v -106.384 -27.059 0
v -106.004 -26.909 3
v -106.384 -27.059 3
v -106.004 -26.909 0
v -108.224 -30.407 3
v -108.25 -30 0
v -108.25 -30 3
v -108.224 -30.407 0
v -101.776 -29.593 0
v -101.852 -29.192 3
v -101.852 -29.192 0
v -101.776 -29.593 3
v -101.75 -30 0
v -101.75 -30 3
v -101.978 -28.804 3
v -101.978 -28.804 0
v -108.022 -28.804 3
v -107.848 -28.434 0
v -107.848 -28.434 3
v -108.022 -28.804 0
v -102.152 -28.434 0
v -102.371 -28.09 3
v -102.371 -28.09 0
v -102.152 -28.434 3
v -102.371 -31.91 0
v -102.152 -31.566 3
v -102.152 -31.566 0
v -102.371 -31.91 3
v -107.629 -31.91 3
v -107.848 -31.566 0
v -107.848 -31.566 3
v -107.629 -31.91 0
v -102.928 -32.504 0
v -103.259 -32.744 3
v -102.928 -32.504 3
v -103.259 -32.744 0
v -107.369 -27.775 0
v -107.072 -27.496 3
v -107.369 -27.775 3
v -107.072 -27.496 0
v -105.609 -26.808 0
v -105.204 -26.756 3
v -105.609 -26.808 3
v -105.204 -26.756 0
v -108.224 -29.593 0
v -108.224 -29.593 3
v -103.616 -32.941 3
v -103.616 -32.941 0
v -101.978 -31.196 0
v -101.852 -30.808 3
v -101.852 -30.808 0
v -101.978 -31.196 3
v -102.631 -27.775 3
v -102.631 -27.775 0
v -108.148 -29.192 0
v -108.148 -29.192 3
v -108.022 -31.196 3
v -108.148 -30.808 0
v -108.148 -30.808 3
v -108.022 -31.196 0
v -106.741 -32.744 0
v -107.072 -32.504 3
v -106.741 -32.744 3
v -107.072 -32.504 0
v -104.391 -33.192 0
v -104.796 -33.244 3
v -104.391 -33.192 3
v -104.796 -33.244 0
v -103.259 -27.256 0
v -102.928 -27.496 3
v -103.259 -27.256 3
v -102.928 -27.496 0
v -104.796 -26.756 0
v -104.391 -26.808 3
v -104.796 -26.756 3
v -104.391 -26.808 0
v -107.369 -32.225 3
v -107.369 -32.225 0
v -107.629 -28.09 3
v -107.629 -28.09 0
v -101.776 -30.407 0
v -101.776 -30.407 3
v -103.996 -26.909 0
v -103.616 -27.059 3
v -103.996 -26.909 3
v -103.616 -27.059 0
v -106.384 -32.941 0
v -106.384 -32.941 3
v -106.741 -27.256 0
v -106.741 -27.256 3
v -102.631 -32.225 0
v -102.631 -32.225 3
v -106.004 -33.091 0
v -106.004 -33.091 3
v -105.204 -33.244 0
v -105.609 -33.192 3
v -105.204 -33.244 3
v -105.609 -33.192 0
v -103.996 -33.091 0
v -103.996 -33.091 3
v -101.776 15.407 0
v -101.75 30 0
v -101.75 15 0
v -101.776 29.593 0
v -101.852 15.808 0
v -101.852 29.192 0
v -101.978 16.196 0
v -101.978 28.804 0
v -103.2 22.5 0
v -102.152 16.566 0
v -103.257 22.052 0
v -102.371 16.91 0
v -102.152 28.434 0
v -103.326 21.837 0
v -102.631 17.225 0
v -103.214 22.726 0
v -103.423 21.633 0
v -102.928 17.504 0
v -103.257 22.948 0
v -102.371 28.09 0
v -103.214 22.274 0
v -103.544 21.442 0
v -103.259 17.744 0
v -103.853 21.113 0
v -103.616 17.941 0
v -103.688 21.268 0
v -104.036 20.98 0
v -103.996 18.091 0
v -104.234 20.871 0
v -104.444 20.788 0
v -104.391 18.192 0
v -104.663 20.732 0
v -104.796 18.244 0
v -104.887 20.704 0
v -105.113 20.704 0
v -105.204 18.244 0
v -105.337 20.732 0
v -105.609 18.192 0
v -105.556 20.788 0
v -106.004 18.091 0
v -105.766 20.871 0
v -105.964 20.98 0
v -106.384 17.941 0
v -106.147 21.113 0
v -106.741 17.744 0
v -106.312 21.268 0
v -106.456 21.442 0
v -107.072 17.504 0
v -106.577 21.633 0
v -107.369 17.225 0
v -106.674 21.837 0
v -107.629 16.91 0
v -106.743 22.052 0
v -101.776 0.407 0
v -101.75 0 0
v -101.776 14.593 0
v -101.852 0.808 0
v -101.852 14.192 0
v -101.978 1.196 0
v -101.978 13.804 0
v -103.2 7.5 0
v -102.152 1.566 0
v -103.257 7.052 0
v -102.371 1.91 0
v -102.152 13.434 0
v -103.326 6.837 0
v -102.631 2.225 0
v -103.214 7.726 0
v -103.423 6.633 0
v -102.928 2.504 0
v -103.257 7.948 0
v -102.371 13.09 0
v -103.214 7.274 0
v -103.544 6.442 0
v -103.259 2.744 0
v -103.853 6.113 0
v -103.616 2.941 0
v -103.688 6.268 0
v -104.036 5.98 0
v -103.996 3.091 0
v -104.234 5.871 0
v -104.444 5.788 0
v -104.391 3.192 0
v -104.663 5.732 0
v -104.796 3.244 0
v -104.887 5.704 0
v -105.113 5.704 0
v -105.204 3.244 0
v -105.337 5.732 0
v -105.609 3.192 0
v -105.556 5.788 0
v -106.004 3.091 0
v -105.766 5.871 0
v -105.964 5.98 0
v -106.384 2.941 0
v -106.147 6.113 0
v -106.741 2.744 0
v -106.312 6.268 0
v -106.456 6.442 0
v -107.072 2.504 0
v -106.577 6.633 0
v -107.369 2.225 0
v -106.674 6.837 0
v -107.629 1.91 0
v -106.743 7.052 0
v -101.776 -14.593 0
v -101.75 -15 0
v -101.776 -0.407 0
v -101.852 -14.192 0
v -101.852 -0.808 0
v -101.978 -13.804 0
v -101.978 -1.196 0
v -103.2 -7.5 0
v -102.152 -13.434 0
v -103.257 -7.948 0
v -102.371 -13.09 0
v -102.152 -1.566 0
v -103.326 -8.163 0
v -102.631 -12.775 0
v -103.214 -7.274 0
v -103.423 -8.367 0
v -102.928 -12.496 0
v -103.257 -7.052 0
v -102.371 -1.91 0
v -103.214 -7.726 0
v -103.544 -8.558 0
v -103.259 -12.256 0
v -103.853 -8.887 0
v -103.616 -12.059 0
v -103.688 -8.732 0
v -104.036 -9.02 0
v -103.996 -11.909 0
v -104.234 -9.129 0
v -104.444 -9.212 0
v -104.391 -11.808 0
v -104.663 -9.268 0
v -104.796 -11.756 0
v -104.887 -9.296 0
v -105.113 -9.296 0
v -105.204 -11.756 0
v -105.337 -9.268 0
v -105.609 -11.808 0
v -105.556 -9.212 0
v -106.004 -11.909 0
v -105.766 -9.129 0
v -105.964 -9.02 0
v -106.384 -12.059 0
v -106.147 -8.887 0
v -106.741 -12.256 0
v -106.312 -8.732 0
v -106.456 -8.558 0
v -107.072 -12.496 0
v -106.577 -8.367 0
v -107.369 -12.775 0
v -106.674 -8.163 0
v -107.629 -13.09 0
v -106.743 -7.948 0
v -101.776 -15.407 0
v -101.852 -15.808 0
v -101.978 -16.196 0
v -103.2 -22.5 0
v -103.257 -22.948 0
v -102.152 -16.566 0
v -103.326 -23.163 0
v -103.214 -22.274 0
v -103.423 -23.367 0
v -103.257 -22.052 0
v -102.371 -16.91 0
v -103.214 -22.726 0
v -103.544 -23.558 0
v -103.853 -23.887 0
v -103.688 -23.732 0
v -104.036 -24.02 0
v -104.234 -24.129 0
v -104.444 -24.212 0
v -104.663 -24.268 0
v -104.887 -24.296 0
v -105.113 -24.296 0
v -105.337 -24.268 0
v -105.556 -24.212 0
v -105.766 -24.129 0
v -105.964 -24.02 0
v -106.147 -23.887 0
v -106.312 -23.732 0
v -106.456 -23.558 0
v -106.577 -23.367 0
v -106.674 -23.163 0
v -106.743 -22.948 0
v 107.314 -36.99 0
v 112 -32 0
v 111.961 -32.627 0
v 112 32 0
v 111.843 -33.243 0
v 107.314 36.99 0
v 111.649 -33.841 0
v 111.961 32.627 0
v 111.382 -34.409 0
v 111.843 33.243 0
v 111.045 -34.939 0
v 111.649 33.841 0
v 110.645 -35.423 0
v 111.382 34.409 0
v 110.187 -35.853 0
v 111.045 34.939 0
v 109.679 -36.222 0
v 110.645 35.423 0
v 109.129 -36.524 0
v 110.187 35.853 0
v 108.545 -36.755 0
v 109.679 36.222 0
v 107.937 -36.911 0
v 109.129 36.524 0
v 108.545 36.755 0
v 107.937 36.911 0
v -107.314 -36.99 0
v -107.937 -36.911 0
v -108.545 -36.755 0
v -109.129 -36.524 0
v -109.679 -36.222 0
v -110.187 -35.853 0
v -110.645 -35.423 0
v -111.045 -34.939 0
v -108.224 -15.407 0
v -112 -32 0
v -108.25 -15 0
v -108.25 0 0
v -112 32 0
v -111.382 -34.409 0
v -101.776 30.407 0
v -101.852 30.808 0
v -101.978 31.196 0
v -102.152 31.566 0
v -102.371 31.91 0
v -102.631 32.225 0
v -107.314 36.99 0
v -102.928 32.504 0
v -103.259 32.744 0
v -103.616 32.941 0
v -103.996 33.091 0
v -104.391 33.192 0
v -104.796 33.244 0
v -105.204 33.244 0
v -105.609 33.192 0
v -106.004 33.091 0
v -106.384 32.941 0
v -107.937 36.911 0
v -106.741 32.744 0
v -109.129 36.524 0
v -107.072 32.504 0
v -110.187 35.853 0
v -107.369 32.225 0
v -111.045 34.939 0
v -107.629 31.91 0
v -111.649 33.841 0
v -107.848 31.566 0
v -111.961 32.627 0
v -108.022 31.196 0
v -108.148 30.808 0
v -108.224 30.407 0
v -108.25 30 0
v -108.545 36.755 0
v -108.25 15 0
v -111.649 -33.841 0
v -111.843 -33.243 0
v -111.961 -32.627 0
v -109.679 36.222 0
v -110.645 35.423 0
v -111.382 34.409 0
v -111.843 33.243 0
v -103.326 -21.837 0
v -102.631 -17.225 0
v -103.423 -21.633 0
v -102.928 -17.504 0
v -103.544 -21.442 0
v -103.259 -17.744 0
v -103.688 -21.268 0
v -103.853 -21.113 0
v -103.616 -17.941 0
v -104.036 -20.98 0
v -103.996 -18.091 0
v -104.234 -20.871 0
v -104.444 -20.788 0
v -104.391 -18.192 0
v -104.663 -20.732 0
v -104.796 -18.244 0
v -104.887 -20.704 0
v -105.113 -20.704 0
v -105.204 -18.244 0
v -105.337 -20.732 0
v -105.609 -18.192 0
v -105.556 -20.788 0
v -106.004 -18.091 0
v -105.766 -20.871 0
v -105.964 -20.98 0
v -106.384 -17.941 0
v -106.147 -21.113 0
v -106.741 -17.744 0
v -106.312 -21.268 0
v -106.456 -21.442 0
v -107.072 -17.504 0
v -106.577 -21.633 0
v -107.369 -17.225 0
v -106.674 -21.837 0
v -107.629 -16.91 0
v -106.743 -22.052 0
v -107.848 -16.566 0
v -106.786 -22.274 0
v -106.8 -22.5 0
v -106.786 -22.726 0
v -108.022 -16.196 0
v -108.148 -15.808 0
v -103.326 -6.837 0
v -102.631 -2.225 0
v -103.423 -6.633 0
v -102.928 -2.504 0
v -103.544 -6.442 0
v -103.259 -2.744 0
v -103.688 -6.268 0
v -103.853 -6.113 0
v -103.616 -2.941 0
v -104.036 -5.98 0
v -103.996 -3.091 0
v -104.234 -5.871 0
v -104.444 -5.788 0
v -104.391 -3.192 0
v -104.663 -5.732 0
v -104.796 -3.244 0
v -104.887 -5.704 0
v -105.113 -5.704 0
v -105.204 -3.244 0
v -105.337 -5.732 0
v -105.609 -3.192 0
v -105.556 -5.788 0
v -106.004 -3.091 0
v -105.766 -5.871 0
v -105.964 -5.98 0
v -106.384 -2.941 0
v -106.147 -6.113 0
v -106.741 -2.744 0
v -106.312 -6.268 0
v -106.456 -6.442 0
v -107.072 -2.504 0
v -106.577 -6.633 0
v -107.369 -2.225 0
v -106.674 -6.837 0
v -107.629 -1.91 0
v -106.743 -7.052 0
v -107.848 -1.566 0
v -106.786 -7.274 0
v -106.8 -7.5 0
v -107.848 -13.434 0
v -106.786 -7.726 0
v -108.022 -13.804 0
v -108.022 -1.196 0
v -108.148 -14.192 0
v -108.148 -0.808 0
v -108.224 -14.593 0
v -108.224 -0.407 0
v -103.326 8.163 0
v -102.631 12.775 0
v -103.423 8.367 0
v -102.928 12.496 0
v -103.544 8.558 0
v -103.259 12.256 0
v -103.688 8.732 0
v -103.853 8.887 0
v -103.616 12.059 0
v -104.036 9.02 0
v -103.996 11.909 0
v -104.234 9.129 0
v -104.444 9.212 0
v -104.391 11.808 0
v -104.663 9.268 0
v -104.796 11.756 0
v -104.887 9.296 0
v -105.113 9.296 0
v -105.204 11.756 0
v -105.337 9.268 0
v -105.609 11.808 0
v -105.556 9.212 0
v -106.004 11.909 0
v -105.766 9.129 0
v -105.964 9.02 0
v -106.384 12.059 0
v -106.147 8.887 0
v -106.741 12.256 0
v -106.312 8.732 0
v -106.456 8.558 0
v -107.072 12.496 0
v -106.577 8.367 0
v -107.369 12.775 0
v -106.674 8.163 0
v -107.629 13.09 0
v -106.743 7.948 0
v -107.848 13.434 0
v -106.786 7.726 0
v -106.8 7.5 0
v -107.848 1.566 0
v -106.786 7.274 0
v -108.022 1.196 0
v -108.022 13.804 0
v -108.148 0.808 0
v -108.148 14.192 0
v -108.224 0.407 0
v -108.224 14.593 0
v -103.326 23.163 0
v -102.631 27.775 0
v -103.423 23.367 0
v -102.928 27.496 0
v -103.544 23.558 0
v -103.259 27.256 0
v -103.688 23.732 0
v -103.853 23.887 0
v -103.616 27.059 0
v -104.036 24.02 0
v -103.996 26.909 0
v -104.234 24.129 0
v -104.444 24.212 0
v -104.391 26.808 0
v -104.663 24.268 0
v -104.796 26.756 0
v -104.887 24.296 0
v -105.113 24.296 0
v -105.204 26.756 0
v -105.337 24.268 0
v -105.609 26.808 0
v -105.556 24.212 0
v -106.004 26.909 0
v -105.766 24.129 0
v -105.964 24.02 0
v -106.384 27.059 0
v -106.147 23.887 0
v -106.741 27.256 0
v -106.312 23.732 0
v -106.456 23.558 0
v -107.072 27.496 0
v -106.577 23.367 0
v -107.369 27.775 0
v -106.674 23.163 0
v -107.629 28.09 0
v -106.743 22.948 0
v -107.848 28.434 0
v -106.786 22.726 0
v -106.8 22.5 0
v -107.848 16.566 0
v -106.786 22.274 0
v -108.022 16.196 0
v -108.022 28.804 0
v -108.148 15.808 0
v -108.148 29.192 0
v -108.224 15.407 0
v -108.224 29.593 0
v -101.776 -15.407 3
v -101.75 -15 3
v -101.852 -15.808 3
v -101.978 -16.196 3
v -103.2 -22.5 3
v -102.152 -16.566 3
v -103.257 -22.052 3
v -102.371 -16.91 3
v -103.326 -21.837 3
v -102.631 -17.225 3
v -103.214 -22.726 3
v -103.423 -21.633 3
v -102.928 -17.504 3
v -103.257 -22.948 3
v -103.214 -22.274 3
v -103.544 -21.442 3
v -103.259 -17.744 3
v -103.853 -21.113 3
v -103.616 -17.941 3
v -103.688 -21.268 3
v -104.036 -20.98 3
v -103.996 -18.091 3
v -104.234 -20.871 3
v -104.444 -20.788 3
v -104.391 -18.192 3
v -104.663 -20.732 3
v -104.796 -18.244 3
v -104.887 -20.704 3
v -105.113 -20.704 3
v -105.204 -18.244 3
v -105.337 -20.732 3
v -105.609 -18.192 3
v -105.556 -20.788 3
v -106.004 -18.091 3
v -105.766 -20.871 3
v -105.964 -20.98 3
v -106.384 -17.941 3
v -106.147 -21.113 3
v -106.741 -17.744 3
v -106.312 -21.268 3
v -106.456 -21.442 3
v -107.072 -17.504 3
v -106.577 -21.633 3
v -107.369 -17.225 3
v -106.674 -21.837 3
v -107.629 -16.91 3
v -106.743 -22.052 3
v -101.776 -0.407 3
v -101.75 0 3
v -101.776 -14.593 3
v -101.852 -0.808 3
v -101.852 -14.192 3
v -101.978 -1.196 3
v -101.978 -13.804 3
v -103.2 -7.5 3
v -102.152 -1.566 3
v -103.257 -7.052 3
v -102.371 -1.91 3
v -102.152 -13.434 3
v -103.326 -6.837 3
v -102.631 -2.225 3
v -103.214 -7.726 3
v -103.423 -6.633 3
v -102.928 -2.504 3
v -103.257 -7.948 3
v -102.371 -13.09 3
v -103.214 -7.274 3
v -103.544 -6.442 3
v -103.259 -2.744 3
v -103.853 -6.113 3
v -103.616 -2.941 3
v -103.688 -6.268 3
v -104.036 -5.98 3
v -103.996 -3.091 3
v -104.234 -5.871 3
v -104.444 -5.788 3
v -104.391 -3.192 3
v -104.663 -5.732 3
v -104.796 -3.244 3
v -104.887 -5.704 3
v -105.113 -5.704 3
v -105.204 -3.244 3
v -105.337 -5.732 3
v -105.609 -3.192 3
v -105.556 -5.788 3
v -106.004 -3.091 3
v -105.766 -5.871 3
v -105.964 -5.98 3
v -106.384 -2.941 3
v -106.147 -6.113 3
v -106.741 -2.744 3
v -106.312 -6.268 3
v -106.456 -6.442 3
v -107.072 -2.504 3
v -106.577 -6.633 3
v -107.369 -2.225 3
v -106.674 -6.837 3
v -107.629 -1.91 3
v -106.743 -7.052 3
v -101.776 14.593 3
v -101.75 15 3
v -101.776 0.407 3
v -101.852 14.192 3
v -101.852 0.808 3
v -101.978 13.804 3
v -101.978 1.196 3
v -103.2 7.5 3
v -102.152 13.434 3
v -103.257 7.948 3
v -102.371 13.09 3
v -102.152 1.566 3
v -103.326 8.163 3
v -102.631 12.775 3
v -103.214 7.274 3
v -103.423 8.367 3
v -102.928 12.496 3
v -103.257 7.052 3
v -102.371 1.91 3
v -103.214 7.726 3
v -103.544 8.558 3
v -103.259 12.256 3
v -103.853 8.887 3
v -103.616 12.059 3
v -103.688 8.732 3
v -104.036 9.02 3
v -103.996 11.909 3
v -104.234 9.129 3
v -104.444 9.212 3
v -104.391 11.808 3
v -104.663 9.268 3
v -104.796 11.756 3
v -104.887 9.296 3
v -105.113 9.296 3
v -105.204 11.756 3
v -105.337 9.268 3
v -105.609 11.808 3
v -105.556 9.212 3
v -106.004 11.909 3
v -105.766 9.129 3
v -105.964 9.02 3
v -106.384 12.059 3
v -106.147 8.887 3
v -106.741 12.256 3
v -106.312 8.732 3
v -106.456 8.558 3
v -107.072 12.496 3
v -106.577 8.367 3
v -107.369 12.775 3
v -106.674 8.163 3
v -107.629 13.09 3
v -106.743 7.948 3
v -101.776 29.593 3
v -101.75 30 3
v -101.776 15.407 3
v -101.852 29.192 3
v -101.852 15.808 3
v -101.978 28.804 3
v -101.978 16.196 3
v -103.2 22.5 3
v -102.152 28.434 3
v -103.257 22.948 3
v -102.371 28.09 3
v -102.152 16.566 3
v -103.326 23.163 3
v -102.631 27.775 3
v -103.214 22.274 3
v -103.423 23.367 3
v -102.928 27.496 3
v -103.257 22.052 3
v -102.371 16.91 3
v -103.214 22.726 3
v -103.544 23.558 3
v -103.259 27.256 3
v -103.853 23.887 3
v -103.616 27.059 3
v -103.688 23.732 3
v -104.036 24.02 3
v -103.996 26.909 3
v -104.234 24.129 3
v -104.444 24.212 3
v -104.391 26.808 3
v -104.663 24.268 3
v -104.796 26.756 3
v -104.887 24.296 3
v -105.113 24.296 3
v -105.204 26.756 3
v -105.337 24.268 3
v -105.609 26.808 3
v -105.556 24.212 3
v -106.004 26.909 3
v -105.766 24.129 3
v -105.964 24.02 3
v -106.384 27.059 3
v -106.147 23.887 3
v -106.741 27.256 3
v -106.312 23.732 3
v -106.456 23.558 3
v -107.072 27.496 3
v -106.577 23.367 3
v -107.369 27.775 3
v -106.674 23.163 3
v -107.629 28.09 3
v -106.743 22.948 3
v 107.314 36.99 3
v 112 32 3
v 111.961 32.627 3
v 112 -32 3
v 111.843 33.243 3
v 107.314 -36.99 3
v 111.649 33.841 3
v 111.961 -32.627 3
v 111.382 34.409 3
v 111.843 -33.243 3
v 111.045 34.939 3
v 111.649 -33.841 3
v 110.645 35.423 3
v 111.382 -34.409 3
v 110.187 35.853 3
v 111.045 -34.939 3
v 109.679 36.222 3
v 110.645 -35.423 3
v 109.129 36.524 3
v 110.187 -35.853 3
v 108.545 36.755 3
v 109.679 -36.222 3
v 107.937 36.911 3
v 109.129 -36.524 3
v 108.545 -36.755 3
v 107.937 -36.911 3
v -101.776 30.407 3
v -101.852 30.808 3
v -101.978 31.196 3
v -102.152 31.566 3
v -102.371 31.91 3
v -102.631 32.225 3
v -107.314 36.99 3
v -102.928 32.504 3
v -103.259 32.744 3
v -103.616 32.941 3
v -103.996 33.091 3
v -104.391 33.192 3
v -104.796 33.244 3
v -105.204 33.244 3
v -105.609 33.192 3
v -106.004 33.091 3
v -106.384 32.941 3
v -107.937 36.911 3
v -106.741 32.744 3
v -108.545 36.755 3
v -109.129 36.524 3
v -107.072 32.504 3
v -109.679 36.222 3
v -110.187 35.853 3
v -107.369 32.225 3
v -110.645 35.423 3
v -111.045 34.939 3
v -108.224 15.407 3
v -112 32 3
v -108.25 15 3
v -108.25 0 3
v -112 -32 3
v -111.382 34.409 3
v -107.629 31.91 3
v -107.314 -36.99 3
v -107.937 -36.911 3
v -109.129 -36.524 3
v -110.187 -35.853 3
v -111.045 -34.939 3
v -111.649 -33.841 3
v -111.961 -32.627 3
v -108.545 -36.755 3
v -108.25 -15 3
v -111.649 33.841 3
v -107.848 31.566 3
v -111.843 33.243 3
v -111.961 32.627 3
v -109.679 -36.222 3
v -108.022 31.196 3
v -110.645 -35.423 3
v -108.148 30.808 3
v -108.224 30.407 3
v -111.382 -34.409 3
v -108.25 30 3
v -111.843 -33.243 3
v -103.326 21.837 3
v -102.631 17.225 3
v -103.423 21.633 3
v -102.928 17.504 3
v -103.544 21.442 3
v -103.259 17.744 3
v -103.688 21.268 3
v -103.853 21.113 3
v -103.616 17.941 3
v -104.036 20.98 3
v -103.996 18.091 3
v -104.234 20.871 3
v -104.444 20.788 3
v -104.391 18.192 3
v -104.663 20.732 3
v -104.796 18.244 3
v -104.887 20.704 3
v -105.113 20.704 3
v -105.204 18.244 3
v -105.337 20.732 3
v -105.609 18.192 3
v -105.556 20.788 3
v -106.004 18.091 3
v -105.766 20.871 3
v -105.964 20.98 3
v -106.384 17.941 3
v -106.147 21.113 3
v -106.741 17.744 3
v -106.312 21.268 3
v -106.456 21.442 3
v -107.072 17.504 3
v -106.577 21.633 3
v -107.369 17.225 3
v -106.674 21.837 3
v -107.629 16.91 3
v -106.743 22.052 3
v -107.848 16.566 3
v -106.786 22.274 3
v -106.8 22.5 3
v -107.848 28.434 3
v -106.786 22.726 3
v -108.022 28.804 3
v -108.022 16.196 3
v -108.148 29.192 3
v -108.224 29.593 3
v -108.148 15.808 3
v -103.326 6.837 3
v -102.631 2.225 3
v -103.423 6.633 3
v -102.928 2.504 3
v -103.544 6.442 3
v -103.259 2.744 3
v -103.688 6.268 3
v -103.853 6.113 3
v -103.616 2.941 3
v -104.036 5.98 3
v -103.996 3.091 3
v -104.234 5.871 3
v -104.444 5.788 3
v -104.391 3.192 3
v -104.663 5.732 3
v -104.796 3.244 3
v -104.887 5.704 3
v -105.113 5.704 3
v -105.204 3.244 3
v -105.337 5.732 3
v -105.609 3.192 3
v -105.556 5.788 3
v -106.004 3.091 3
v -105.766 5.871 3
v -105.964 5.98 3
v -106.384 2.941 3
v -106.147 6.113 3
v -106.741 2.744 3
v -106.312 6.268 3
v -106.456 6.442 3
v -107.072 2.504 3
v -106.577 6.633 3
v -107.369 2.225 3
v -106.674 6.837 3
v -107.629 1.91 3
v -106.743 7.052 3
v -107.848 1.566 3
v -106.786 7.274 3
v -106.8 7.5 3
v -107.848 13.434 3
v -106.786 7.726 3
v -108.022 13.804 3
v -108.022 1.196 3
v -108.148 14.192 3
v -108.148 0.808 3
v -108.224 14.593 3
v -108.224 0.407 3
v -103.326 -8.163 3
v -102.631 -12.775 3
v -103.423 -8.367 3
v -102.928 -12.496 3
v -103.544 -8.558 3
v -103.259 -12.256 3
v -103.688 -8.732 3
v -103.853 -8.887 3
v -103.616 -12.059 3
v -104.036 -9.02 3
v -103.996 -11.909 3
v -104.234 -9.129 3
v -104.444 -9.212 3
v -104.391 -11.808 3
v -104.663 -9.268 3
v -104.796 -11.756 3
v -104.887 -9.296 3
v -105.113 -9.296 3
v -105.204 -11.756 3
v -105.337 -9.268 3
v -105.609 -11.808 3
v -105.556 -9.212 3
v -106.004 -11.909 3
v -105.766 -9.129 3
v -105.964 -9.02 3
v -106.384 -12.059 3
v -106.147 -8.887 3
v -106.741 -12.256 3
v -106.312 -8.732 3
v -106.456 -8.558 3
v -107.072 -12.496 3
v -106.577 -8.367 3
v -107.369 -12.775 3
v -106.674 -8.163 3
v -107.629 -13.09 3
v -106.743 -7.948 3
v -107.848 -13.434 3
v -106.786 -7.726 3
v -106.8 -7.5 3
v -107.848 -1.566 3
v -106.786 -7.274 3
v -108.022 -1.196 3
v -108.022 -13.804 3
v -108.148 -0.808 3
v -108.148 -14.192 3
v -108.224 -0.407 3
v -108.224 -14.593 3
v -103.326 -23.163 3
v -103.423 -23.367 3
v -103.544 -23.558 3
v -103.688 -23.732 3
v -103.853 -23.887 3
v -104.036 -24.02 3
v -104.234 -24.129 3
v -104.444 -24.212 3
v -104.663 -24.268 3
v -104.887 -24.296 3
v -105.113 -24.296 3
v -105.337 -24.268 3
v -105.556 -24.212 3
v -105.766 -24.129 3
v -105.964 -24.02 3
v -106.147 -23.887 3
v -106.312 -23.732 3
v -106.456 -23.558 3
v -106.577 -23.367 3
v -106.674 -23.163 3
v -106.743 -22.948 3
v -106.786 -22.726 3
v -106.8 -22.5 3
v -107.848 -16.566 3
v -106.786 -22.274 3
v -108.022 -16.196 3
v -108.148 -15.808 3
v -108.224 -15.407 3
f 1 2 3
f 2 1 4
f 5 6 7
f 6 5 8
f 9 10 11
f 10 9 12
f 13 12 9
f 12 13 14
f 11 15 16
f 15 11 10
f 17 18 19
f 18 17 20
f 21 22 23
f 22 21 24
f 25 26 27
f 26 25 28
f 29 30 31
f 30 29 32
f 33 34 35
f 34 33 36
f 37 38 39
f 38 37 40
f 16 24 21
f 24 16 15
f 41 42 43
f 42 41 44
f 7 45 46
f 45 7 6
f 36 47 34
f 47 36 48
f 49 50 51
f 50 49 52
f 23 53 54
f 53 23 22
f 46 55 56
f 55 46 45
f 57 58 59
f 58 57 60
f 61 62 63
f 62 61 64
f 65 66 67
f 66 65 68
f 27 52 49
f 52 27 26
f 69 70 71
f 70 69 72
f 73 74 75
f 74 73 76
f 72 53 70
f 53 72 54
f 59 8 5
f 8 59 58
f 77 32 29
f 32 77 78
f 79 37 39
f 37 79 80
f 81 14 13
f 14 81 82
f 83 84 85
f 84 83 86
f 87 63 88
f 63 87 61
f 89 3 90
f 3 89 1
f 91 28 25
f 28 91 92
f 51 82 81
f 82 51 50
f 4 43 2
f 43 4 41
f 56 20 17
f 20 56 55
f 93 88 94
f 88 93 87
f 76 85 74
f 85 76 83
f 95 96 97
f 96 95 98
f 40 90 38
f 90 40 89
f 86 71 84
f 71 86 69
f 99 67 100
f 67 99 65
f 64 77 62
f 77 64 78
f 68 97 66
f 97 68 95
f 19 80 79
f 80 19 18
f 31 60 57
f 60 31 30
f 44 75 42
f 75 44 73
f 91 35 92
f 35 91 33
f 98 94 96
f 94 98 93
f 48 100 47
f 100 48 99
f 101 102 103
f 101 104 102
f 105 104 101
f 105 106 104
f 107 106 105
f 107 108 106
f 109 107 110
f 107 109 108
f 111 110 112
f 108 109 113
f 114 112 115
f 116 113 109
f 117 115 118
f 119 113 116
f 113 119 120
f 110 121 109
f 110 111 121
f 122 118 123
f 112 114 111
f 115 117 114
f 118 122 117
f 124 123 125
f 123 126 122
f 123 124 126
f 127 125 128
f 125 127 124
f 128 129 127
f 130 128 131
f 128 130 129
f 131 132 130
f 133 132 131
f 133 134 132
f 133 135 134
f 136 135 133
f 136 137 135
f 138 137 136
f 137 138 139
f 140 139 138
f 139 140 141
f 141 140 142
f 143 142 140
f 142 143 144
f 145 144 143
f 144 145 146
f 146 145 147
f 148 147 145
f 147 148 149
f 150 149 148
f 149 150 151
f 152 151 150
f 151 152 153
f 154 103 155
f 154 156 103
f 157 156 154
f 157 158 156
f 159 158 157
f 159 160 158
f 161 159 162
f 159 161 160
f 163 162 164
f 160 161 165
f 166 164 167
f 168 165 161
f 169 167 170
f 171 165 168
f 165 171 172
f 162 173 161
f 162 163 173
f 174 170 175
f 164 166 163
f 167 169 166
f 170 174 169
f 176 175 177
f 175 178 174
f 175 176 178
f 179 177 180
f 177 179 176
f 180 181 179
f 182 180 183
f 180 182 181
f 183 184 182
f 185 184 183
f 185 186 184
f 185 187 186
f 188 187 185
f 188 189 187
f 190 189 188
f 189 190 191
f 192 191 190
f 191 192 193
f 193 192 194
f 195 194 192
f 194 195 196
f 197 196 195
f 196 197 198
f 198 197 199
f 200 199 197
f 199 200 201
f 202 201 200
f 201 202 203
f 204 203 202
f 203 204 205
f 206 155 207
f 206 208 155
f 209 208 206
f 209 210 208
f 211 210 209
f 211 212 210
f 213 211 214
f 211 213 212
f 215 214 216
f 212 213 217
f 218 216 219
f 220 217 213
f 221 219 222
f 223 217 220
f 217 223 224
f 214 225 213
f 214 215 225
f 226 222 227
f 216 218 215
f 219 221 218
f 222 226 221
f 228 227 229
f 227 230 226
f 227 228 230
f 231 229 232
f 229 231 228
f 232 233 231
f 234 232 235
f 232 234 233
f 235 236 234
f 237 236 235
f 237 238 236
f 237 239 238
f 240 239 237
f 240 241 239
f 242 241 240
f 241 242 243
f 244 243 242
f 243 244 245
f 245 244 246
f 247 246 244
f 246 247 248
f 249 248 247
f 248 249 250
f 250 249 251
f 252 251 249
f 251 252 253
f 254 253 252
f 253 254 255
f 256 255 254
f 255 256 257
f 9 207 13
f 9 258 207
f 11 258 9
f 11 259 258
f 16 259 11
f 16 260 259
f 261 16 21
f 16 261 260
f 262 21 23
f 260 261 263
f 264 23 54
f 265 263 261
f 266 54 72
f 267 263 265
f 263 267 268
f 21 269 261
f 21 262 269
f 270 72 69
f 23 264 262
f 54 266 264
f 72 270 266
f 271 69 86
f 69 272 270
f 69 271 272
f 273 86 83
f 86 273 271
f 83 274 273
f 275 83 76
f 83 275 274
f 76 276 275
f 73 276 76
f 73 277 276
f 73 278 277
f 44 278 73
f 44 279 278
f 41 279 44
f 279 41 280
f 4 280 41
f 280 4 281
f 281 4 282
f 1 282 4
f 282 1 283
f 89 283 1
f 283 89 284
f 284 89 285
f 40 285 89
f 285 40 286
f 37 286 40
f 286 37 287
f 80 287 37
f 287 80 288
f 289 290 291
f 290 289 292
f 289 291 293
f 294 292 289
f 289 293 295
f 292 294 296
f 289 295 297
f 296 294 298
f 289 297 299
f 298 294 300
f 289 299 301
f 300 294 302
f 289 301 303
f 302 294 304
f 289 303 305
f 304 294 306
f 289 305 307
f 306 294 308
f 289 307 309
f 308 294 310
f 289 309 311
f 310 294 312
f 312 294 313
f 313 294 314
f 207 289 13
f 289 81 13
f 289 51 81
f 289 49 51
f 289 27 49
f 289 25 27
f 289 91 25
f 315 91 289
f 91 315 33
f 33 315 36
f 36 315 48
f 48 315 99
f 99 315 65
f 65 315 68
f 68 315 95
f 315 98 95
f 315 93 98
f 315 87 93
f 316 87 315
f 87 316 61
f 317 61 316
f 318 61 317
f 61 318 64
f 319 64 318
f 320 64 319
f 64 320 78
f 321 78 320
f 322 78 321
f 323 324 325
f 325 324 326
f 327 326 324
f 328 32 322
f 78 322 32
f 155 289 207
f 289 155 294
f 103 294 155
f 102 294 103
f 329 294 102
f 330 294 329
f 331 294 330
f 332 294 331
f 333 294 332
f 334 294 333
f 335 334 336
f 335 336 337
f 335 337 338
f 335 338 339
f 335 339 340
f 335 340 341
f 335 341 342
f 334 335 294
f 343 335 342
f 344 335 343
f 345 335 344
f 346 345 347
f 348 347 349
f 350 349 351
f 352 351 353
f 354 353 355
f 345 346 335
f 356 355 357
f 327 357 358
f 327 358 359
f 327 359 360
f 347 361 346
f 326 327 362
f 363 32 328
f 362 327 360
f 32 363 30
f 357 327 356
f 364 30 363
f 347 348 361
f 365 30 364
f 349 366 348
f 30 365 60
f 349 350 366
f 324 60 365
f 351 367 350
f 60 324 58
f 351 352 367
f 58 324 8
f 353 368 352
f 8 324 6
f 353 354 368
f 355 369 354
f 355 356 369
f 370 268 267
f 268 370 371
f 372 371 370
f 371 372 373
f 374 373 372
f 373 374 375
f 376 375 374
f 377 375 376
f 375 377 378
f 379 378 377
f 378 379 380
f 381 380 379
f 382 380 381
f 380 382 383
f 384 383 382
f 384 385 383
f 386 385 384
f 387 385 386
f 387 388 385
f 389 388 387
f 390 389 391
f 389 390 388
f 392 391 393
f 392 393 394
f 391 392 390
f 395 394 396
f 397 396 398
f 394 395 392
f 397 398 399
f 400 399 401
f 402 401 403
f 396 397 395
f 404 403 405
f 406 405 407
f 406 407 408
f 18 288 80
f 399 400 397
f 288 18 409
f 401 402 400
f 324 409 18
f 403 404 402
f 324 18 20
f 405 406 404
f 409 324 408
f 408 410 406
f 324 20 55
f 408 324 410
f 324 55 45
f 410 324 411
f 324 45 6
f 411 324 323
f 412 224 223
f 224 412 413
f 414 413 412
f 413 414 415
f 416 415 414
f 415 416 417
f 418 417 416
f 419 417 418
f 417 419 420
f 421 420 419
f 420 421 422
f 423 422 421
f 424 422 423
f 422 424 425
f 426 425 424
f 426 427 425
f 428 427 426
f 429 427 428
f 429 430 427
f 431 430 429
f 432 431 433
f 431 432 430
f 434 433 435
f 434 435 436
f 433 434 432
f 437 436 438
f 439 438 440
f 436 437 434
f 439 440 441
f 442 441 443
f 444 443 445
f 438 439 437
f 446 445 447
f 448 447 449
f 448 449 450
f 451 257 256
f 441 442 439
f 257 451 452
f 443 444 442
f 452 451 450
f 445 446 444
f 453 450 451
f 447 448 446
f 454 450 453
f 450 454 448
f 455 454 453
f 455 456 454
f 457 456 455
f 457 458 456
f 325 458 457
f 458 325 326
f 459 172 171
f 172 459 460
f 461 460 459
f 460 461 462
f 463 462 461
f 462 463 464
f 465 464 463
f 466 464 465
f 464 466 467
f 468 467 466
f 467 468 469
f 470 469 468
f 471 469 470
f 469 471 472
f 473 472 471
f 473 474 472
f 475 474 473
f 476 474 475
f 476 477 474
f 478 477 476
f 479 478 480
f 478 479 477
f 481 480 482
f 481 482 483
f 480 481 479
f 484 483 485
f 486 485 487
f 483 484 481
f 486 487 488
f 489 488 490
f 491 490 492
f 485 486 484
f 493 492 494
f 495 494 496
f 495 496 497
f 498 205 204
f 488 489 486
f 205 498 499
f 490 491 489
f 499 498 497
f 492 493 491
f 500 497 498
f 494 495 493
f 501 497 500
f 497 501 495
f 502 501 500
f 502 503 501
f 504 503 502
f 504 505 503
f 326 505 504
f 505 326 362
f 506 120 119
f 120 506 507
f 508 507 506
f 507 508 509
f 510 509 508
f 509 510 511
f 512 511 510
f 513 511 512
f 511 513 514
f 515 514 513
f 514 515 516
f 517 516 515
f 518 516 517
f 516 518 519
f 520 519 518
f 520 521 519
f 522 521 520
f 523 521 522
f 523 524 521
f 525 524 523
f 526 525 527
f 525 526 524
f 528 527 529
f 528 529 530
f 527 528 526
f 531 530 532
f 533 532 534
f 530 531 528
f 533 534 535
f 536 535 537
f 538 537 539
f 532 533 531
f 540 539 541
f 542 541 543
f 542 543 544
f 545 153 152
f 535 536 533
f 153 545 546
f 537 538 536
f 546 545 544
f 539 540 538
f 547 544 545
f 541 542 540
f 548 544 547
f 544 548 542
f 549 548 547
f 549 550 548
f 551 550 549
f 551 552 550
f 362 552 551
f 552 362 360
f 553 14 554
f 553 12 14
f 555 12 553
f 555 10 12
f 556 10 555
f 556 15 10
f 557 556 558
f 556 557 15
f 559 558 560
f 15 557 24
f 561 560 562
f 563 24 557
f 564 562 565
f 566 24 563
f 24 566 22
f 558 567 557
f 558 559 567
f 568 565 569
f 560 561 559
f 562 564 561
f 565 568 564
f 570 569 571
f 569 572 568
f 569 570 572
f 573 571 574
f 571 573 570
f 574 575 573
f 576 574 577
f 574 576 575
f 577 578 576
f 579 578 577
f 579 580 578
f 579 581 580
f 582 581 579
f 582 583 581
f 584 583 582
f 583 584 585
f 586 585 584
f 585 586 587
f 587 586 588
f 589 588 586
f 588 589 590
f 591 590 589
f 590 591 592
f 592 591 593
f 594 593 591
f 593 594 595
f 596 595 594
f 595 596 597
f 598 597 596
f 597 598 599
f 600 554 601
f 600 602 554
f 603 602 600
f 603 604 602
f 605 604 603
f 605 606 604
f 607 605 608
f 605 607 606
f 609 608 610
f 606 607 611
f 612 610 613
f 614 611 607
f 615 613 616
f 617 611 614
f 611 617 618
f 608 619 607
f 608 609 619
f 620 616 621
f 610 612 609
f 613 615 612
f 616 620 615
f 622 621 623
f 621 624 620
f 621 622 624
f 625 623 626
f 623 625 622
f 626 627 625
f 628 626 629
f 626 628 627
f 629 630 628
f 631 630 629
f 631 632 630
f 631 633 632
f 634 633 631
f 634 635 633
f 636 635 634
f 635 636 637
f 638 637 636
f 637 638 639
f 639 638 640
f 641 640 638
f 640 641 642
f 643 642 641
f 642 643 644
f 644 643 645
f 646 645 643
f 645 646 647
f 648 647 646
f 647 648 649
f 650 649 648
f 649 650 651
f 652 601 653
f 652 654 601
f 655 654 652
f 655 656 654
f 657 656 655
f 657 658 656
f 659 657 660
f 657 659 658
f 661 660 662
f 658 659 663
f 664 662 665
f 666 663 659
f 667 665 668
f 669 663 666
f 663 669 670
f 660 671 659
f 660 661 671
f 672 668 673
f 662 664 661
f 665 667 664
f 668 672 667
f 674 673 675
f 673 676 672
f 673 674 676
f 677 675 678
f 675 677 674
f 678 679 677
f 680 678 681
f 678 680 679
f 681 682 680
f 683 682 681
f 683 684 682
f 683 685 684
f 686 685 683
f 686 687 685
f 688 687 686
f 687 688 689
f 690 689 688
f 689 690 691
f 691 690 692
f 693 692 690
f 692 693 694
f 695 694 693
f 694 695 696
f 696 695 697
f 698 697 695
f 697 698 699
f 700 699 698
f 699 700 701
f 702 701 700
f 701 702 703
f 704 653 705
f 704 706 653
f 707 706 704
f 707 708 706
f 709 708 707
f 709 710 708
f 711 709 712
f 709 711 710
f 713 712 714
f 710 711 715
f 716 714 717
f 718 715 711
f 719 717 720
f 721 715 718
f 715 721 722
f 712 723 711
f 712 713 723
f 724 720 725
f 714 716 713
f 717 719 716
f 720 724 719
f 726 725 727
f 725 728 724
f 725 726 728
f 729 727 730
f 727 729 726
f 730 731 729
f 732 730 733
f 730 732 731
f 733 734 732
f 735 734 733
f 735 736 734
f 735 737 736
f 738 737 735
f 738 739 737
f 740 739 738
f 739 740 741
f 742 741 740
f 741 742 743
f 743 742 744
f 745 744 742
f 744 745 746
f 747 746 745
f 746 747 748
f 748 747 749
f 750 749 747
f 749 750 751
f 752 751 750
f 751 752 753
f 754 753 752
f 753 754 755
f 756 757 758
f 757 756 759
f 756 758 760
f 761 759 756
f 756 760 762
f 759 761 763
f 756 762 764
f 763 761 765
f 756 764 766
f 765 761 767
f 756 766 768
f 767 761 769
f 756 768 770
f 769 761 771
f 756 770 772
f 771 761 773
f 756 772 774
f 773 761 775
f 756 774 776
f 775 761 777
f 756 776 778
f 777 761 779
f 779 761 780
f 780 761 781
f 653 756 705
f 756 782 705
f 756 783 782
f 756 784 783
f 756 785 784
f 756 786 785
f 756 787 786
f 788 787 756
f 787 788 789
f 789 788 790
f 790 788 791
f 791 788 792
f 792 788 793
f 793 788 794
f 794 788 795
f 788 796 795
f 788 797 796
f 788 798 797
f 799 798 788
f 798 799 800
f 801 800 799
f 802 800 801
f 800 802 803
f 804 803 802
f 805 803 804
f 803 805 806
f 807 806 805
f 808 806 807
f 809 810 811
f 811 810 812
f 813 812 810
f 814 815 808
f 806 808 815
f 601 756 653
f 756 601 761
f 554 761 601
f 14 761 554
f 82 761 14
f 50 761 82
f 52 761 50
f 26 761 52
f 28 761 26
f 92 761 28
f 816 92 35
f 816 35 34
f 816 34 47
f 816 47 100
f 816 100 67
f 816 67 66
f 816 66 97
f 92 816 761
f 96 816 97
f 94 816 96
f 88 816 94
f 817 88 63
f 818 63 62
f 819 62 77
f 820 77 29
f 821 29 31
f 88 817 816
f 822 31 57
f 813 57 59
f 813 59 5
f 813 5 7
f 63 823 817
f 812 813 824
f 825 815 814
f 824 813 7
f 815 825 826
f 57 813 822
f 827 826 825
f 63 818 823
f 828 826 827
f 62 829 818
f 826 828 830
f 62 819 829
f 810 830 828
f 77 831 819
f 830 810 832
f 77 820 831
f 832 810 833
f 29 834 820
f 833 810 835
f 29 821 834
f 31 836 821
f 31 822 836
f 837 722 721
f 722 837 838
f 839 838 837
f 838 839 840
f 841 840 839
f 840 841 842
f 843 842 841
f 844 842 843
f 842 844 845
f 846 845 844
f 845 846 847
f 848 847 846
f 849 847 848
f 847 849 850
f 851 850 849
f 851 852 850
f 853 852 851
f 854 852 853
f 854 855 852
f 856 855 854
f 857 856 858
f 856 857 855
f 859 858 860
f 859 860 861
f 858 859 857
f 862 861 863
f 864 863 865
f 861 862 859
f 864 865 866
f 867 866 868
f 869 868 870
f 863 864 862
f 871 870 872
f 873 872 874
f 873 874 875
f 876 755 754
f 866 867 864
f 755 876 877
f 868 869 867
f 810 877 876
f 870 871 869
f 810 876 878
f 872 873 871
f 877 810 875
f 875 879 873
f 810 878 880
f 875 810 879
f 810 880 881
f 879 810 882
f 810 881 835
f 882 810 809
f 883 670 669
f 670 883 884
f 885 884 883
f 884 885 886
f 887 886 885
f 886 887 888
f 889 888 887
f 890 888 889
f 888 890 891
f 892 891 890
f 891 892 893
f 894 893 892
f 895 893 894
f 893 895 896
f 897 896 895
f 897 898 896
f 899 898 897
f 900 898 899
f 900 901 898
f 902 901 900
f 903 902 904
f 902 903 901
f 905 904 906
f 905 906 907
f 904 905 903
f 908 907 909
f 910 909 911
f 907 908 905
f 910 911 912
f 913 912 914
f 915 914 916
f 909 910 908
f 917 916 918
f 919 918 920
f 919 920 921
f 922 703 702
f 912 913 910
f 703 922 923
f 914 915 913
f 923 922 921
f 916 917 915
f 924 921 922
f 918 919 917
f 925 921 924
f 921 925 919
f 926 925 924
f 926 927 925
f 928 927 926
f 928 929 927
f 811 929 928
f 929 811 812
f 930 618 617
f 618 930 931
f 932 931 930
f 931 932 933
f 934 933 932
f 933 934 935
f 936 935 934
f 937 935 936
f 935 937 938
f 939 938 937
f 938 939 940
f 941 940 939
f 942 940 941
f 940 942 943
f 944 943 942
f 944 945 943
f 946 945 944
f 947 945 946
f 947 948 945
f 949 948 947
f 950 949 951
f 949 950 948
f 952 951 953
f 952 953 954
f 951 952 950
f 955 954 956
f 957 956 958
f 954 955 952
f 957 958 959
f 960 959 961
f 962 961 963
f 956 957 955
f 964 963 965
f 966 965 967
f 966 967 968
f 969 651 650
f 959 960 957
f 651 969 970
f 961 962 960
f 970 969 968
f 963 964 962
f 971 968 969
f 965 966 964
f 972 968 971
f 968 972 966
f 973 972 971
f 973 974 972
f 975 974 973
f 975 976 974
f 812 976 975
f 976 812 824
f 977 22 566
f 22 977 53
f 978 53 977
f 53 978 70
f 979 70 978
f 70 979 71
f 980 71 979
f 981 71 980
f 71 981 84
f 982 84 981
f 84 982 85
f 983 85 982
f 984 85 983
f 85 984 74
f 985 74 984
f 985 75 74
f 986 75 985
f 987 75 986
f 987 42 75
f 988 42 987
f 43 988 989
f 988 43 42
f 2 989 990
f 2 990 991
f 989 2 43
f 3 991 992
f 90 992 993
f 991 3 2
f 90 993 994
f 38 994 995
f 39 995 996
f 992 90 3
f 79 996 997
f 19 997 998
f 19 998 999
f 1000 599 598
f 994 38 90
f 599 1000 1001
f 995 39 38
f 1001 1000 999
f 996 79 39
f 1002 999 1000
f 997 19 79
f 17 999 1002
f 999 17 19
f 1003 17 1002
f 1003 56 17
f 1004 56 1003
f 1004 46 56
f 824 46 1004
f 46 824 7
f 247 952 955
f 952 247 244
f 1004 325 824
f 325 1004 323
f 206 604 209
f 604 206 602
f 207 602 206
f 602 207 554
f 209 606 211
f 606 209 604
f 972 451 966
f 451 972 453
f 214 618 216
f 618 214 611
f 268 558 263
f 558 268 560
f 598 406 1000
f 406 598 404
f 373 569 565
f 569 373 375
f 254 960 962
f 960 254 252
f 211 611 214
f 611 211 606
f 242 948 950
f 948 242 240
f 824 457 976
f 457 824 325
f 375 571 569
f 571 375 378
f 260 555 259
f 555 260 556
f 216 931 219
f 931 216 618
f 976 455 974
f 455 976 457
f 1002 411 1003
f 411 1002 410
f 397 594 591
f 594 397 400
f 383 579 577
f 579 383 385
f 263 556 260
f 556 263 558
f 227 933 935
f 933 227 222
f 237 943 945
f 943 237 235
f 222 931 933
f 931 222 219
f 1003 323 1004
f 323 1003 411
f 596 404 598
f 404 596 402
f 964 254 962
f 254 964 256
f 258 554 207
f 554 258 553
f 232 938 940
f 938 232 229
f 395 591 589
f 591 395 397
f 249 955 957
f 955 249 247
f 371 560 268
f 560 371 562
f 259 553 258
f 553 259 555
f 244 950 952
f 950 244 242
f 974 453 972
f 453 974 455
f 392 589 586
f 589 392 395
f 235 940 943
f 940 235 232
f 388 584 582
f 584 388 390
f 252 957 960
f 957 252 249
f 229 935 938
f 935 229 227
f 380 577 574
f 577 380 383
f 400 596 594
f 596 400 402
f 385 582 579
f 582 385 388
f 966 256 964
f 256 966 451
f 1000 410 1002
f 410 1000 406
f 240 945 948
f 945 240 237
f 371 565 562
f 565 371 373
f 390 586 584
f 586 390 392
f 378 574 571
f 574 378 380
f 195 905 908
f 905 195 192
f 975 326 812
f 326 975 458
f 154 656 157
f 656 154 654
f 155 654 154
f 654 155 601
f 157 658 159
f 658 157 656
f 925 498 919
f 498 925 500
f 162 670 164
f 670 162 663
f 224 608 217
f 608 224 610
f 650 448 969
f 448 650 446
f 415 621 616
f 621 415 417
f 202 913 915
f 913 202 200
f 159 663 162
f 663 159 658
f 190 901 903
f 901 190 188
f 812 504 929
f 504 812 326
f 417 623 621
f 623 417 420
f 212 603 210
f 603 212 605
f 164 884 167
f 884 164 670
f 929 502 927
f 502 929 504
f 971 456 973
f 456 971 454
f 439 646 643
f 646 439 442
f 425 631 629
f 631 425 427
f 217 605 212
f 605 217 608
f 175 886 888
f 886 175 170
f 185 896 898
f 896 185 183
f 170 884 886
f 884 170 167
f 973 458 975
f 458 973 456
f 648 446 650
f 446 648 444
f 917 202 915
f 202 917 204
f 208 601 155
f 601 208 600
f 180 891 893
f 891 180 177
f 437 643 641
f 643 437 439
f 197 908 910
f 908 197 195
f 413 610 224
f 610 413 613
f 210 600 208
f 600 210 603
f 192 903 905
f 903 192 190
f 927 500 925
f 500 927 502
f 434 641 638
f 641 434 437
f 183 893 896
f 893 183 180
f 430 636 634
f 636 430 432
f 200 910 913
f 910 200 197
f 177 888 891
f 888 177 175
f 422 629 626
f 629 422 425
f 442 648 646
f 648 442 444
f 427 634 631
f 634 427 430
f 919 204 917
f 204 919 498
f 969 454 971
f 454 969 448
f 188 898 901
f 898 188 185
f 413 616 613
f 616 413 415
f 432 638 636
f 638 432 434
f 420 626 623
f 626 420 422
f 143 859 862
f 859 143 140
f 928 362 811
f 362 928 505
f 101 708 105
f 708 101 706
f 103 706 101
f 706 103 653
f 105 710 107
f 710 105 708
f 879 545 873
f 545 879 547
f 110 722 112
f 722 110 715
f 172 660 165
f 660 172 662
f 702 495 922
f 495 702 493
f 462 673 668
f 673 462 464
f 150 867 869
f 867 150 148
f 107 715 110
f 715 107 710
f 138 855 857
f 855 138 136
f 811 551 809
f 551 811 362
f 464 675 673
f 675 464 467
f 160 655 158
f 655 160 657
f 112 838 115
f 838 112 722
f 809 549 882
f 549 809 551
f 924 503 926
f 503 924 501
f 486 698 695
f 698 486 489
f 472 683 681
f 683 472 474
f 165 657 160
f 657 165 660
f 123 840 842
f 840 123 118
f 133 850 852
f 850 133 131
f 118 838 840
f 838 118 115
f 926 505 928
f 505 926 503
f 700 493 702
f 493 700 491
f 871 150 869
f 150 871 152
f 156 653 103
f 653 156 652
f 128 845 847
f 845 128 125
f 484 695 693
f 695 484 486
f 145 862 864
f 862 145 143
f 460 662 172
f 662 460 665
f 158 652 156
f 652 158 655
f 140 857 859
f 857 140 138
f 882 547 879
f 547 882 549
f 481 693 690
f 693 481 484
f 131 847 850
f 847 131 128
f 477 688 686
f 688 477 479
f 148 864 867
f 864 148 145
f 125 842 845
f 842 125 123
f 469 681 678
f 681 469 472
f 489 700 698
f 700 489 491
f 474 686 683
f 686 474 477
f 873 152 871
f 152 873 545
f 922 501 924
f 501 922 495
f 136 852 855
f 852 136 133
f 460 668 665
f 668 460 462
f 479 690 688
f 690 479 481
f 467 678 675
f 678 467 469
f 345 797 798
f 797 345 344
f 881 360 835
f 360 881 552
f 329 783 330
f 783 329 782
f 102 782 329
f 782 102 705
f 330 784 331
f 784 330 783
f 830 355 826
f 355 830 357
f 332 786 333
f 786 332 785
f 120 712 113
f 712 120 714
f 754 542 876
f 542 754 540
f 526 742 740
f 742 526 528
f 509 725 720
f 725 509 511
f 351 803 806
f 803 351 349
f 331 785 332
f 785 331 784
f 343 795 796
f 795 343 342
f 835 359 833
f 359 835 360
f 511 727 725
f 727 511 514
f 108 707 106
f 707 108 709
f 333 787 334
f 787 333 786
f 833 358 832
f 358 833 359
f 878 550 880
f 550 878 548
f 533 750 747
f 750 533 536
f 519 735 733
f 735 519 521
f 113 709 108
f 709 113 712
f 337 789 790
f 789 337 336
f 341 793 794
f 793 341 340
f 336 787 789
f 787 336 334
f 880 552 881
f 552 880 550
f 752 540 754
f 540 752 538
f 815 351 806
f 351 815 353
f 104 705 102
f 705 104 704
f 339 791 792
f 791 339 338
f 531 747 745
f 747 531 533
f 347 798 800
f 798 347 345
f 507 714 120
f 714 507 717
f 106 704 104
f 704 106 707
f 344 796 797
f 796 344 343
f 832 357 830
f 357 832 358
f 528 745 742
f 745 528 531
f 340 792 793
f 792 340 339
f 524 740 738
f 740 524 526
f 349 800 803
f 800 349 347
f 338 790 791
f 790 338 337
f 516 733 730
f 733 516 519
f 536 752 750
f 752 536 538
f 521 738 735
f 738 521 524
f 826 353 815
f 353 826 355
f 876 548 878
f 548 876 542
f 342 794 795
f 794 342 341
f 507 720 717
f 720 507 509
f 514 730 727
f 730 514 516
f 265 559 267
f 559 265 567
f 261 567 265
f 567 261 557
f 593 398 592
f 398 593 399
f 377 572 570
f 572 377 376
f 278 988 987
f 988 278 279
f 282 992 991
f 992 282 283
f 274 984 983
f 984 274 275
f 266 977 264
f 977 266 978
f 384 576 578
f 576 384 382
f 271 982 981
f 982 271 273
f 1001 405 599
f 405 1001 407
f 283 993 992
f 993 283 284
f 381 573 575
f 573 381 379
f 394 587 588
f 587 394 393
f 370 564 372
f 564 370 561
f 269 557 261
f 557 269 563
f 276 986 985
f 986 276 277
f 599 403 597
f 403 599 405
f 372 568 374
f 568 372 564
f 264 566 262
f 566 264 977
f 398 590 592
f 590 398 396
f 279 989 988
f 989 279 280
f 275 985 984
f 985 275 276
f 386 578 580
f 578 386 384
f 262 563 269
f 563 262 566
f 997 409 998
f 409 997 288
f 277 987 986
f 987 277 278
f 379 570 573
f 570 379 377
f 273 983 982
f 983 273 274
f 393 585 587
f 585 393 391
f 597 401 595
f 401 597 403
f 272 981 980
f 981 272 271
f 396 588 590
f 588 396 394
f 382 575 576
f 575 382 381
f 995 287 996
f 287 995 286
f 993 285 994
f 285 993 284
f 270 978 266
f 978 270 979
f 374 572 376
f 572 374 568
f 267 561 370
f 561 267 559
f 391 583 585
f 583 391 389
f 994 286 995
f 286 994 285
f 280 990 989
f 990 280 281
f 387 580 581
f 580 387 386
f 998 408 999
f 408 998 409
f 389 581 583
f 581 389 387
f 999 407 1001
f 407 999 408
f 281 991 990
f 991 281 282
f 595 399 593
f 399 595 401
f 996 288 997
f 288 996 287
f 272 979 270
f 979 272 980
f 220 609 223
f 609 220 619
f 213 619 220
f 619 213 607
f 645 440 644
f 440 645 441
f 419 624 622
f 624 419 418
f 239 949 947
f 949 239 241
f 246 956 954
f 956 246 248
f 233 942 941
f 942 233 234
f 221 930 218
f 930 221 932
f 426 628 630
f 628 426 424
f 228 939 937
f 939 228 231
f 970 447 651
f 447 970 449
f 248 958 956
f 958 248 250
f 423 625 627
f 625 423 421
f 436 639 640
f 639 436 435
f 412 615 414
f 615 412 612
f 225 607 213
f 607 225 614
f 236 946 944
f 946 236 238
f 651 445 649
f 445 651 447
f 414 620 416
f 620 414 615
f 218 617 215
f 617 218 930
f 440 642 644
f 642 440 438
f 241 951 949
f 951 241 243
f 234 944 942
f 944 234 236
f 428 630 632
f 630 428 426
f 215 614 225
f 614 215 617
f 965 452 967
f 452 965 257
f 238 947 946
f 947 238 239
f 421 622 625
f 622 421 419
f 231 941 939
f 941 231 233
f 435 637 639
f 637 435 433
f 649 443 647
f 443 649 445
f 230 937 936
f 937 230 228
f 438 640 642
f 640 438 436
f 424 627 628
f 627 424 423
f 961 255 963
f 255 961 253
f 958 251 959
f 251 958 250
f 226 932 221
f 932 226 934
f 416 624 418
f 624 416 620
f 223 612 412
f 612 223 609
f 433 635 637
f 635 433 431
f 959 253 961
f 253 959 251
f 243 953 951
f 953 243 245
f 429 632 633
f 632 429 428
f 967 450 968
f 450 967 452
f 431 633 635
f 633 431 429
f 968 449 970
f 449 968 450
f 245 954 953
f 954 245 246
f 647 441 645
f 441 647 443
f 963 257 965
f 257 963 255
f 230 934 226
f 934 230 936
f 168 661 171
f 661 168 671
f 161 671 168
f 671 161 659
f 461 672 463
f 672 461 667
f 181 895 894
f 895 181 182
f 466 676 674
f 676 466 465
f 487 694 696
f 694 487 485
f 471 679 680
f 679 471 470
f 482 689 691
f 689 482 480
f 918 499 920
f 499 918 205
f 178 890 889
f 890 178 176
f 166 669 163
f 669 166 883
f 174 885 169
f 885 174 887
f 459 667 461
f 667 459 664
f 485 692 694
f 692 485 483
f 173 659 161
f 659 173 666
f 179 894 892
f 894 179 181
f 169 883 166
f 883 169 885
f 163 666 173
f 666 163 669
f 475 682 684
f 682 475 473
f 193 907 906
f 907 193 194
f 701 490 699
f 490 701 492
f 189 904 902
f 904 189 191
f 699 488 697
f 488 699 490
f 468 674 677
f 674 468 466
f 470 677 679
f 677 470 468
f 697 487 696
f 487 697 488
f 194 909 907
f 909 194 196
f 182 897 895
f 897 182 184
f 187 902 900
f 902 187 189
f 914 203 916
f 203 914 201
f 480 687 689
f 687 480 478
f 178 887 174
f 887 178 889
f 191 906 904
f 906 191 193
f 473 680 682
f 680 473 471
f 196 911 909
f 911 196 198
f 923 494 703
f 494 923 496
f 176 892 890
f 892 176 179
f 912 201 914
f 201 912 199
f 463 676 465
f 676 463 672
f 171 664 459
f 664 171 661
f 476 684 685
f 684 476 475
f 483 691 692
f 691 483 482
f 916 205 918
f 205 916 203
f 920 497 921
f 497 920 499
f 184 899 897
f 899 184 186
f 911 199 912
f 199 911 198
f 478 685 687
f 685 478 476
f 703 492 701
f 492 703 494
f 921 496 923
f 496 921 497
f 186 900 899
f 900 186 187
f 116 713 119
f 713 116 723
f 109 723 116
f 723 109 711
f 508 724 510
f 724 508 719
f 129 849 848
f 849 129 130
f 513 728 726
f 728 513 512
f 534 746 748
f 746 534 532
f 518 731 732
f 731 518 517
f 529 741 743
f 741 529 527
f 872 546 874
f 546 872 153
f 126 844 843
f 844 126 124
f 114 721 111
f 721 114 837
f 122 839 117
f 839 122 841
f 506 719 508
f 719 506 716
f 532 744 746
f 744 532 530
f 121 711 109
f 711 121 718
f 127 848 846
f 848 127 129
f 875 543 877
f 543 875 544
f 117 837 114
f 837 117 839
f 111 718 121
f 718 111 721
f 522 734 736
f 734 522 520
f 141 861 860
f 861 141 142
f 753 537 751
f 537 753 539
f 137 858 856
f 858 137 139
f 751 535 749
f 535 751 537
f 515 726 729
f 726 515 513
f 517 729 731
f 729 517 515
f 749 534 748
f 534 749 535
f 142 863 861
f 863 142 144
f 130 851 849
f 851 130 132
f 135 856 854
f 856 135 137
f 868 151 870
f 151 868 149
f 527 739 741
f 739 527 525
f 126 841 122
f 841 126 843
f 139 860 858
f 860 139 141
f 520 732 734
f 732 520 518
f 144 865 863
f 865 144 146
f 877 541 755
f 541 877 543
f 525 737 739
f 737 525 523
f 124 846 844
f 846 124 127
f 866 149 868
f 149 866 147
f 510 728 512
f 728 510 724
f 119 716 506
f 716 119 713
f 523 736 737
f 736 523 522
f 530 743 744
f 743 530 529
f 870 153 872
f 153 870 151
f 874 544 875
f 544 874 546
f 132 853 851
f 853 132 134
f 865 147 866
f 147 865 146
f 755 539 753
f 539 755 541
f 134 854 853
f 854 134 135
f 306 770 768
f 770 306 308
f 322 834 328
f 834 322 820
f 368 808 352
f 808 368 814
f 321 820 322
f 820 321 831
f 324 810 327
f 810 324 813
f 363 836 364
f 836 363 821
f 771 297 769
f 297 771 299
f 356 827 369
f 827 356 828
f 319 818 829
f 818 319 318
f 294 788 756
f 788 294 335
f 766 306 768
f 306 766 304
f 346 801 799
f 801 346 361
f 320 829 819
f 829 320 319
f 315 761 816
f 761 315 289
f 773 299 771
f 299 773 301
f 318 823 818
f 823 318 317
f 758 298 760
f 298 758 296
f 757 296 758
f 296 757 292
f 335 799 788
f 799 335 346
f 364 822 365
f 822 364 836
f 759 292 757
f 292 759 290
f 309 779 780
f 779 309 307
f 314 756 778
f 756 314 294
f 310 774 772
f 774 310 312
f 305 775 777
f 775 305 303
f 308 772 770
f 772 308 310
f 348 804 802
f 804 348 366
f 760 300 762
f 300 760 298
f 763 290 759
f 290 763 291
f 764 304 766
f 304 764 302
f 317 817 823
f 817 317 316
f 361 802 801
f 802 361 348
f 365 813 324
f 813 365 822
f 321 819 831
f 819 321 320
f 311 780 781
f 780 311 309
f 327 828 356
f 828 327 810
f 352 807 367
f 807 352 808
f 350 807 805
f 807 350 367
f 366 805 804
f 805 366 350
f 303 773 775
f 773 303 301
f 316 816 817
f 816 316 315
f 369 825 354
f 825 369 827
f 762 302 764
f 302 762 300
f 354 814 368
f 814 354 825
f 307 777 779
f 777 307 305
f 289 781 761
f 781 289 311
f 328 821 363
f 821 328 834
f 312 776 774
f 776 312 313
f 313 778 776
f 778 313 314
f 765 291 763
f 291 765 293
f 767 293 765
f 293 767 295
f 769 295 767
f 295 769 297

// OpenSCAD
$fn = 50;


difference() {
	union() {
		hull() {
			translate(v = [-107.0000000000, 32.0000000000, 0]) {
				cylinder(h = 3, r = 5);
			}
			translate(v = [107.0000000000, 32.0000000000, 0]) {
				cylinder(h = 3, r = 5);
			}
			translate(v = [-107.0000000000, -32.0000000000, 0]) {
				cylinder(h = 3, r = 5);
			}
			translate(v = [107.0000000000, -32.0000000000, 0]) {
				cylinder(h = 3, r = 5);
			}
		}
	}
	union() {
		translate(v = [-105.0000000000, -30.0000000000, 0]) {
			cylinder(h = 3, r = 3.2500000000);
		}
		translate(v = [-105.0000000000, -15.0000000000, 0]) {
			cylinder(h = 3, r = 3.2500000000);
		}
		translate(v = [-105.0000000000, 0.0000000000, 0]) {
			cylinder(h = 3, r = 3.2500000000);
		}
		translate(v = [-105.0000000000, 15.0000000000, 0]) {
			cylinder(h = 3, r = 3.2500000000);
		}
		translate(v = [-105.0000000000, 30.0000000000, 0]) {
			cylinder(h = 3, r = 3.2500000000);
		}
		translate(v = [-105.0000000000, -30.0000000000, 0]) {
			cylinder(h = 3, r = 1.8000000000);
		}
		translate(v = [-105.0000000000, -22.5000000000, 0]) {
			cylinder(h = 3, r = 1.8000000000);
		}
		translate(v = [-105.0000000000, -15.0000000000, 0]) {
			cylinder(h = 3, r = 1.8000000000);
		}
		translate(v = [-105.0000000000, -7.5000000000, 0]) {
			cylinder(h = 3, r = 1.8000000000);
		}
		translate(v = [-105.0000000000, 0.0000000000, 0]) {
			cylinder(h = 3, r = 1.8000000000);
		}
		translate(v = [-105.0000000000, 7.5000000000, 0]) {
			cylinder(h = 3, r = 1.8000000000);
		}
		translate(v = [-105.0000000000, 15.0000000000, 0]) {
			cylinder(h = 3, r = 1.8000000000);
		}
		translate(v = [-105.0000000000, 22.5000000000, 0]) {
			cylinder(h = 3, r = 1.8000000000);
		}
		translate(v = [-105.0000000000, 30.0000000000, 0]) {
			cylinder(h = 3, r = 1.8000000000);
		}
		translate(v = [-105.0000000000, -30.0000000000, 0]) {
			cylinder(h = 3, r = 1.8000000000);
		}
		translate(v = [-105.0000000000, -22.5000000000, 0]) {
			cylinder(h = 3, r = 1.8000000000);
		}
		translate(v = [-105.0000000000, -15.0000000000, 0]) {
			cylinder(h = 3, r = 1.8000000000);
		}
		translate(v = [-105.0000000000, -7.5000000000, 0]) {
			cylinder(h = 3, r = 1.8000000000);
		}
		translate(v = [-105.0000000000, 0.0000000000, 0]) {
			cylinder(h = 3, r = 1.8000000000);
		}
		translate(v = [-105.0000000000, 7.5000000000, 0]) {
			cylinder(h = 3, r = 1.8000000000);
		}
		translate(v = [-105.0000000000, 15.0000000000, 0]) {
			cylinder(h = 3, r = 1.8000000000);
		}
		translate(v = [-105.0000000000, 22.5000000000, 0]) {
			cylinder(h = 3, r = 1.8000000000);
		}
		translate(v = [-105.0000000000, 30.0000000000, 0]) {
			cylinder(h = 3, r = 1.8000000000);
		}
		translate(v = [-105.0000000000, -30.0000000000, 0]) {
			cylinder(h = 3, r = 1.8000000000);
		}
		translate(v = [-105.0000000000, -22.5000000000, 0]) {
			cylinder(h = 3, r = 1.8000000000);
		}
		translate(v = [-105.0000000000, -15.0000000000, 0]) {
			cylinder(h = 3, r = 1.8000000000);
		}
		translate(v = [-105.0000000000, -7.5000000000, 0]) {
			cylinder(h = 3, r = 1.8000000000);
		}
		translate(v = [-105.0000000000, 0.0000000000, 0]) {
			cylinder(h = 3, r = 1.8000000000);
		}
		translate(v = [-105.0000000000, 7.5000000000, 0]) {
			cylinder(h = 3, r = 1.8000000000);
		}
		translate(v = [-105.0000000000, 15.0000000000, 0]) {
			cylinder(h = 3, r = 1.8000000000);
		}
		translate(v = [-105.0000000000, 22.5000000000, 0]) {
			cylinder(h = 3, r = 1.8000000000);
		}
		translate(v = [-105.0000000000, 30.0000000000, 0]) {
			cylinder(h = 3, r = 1.8000000000);
		}
	}
}
